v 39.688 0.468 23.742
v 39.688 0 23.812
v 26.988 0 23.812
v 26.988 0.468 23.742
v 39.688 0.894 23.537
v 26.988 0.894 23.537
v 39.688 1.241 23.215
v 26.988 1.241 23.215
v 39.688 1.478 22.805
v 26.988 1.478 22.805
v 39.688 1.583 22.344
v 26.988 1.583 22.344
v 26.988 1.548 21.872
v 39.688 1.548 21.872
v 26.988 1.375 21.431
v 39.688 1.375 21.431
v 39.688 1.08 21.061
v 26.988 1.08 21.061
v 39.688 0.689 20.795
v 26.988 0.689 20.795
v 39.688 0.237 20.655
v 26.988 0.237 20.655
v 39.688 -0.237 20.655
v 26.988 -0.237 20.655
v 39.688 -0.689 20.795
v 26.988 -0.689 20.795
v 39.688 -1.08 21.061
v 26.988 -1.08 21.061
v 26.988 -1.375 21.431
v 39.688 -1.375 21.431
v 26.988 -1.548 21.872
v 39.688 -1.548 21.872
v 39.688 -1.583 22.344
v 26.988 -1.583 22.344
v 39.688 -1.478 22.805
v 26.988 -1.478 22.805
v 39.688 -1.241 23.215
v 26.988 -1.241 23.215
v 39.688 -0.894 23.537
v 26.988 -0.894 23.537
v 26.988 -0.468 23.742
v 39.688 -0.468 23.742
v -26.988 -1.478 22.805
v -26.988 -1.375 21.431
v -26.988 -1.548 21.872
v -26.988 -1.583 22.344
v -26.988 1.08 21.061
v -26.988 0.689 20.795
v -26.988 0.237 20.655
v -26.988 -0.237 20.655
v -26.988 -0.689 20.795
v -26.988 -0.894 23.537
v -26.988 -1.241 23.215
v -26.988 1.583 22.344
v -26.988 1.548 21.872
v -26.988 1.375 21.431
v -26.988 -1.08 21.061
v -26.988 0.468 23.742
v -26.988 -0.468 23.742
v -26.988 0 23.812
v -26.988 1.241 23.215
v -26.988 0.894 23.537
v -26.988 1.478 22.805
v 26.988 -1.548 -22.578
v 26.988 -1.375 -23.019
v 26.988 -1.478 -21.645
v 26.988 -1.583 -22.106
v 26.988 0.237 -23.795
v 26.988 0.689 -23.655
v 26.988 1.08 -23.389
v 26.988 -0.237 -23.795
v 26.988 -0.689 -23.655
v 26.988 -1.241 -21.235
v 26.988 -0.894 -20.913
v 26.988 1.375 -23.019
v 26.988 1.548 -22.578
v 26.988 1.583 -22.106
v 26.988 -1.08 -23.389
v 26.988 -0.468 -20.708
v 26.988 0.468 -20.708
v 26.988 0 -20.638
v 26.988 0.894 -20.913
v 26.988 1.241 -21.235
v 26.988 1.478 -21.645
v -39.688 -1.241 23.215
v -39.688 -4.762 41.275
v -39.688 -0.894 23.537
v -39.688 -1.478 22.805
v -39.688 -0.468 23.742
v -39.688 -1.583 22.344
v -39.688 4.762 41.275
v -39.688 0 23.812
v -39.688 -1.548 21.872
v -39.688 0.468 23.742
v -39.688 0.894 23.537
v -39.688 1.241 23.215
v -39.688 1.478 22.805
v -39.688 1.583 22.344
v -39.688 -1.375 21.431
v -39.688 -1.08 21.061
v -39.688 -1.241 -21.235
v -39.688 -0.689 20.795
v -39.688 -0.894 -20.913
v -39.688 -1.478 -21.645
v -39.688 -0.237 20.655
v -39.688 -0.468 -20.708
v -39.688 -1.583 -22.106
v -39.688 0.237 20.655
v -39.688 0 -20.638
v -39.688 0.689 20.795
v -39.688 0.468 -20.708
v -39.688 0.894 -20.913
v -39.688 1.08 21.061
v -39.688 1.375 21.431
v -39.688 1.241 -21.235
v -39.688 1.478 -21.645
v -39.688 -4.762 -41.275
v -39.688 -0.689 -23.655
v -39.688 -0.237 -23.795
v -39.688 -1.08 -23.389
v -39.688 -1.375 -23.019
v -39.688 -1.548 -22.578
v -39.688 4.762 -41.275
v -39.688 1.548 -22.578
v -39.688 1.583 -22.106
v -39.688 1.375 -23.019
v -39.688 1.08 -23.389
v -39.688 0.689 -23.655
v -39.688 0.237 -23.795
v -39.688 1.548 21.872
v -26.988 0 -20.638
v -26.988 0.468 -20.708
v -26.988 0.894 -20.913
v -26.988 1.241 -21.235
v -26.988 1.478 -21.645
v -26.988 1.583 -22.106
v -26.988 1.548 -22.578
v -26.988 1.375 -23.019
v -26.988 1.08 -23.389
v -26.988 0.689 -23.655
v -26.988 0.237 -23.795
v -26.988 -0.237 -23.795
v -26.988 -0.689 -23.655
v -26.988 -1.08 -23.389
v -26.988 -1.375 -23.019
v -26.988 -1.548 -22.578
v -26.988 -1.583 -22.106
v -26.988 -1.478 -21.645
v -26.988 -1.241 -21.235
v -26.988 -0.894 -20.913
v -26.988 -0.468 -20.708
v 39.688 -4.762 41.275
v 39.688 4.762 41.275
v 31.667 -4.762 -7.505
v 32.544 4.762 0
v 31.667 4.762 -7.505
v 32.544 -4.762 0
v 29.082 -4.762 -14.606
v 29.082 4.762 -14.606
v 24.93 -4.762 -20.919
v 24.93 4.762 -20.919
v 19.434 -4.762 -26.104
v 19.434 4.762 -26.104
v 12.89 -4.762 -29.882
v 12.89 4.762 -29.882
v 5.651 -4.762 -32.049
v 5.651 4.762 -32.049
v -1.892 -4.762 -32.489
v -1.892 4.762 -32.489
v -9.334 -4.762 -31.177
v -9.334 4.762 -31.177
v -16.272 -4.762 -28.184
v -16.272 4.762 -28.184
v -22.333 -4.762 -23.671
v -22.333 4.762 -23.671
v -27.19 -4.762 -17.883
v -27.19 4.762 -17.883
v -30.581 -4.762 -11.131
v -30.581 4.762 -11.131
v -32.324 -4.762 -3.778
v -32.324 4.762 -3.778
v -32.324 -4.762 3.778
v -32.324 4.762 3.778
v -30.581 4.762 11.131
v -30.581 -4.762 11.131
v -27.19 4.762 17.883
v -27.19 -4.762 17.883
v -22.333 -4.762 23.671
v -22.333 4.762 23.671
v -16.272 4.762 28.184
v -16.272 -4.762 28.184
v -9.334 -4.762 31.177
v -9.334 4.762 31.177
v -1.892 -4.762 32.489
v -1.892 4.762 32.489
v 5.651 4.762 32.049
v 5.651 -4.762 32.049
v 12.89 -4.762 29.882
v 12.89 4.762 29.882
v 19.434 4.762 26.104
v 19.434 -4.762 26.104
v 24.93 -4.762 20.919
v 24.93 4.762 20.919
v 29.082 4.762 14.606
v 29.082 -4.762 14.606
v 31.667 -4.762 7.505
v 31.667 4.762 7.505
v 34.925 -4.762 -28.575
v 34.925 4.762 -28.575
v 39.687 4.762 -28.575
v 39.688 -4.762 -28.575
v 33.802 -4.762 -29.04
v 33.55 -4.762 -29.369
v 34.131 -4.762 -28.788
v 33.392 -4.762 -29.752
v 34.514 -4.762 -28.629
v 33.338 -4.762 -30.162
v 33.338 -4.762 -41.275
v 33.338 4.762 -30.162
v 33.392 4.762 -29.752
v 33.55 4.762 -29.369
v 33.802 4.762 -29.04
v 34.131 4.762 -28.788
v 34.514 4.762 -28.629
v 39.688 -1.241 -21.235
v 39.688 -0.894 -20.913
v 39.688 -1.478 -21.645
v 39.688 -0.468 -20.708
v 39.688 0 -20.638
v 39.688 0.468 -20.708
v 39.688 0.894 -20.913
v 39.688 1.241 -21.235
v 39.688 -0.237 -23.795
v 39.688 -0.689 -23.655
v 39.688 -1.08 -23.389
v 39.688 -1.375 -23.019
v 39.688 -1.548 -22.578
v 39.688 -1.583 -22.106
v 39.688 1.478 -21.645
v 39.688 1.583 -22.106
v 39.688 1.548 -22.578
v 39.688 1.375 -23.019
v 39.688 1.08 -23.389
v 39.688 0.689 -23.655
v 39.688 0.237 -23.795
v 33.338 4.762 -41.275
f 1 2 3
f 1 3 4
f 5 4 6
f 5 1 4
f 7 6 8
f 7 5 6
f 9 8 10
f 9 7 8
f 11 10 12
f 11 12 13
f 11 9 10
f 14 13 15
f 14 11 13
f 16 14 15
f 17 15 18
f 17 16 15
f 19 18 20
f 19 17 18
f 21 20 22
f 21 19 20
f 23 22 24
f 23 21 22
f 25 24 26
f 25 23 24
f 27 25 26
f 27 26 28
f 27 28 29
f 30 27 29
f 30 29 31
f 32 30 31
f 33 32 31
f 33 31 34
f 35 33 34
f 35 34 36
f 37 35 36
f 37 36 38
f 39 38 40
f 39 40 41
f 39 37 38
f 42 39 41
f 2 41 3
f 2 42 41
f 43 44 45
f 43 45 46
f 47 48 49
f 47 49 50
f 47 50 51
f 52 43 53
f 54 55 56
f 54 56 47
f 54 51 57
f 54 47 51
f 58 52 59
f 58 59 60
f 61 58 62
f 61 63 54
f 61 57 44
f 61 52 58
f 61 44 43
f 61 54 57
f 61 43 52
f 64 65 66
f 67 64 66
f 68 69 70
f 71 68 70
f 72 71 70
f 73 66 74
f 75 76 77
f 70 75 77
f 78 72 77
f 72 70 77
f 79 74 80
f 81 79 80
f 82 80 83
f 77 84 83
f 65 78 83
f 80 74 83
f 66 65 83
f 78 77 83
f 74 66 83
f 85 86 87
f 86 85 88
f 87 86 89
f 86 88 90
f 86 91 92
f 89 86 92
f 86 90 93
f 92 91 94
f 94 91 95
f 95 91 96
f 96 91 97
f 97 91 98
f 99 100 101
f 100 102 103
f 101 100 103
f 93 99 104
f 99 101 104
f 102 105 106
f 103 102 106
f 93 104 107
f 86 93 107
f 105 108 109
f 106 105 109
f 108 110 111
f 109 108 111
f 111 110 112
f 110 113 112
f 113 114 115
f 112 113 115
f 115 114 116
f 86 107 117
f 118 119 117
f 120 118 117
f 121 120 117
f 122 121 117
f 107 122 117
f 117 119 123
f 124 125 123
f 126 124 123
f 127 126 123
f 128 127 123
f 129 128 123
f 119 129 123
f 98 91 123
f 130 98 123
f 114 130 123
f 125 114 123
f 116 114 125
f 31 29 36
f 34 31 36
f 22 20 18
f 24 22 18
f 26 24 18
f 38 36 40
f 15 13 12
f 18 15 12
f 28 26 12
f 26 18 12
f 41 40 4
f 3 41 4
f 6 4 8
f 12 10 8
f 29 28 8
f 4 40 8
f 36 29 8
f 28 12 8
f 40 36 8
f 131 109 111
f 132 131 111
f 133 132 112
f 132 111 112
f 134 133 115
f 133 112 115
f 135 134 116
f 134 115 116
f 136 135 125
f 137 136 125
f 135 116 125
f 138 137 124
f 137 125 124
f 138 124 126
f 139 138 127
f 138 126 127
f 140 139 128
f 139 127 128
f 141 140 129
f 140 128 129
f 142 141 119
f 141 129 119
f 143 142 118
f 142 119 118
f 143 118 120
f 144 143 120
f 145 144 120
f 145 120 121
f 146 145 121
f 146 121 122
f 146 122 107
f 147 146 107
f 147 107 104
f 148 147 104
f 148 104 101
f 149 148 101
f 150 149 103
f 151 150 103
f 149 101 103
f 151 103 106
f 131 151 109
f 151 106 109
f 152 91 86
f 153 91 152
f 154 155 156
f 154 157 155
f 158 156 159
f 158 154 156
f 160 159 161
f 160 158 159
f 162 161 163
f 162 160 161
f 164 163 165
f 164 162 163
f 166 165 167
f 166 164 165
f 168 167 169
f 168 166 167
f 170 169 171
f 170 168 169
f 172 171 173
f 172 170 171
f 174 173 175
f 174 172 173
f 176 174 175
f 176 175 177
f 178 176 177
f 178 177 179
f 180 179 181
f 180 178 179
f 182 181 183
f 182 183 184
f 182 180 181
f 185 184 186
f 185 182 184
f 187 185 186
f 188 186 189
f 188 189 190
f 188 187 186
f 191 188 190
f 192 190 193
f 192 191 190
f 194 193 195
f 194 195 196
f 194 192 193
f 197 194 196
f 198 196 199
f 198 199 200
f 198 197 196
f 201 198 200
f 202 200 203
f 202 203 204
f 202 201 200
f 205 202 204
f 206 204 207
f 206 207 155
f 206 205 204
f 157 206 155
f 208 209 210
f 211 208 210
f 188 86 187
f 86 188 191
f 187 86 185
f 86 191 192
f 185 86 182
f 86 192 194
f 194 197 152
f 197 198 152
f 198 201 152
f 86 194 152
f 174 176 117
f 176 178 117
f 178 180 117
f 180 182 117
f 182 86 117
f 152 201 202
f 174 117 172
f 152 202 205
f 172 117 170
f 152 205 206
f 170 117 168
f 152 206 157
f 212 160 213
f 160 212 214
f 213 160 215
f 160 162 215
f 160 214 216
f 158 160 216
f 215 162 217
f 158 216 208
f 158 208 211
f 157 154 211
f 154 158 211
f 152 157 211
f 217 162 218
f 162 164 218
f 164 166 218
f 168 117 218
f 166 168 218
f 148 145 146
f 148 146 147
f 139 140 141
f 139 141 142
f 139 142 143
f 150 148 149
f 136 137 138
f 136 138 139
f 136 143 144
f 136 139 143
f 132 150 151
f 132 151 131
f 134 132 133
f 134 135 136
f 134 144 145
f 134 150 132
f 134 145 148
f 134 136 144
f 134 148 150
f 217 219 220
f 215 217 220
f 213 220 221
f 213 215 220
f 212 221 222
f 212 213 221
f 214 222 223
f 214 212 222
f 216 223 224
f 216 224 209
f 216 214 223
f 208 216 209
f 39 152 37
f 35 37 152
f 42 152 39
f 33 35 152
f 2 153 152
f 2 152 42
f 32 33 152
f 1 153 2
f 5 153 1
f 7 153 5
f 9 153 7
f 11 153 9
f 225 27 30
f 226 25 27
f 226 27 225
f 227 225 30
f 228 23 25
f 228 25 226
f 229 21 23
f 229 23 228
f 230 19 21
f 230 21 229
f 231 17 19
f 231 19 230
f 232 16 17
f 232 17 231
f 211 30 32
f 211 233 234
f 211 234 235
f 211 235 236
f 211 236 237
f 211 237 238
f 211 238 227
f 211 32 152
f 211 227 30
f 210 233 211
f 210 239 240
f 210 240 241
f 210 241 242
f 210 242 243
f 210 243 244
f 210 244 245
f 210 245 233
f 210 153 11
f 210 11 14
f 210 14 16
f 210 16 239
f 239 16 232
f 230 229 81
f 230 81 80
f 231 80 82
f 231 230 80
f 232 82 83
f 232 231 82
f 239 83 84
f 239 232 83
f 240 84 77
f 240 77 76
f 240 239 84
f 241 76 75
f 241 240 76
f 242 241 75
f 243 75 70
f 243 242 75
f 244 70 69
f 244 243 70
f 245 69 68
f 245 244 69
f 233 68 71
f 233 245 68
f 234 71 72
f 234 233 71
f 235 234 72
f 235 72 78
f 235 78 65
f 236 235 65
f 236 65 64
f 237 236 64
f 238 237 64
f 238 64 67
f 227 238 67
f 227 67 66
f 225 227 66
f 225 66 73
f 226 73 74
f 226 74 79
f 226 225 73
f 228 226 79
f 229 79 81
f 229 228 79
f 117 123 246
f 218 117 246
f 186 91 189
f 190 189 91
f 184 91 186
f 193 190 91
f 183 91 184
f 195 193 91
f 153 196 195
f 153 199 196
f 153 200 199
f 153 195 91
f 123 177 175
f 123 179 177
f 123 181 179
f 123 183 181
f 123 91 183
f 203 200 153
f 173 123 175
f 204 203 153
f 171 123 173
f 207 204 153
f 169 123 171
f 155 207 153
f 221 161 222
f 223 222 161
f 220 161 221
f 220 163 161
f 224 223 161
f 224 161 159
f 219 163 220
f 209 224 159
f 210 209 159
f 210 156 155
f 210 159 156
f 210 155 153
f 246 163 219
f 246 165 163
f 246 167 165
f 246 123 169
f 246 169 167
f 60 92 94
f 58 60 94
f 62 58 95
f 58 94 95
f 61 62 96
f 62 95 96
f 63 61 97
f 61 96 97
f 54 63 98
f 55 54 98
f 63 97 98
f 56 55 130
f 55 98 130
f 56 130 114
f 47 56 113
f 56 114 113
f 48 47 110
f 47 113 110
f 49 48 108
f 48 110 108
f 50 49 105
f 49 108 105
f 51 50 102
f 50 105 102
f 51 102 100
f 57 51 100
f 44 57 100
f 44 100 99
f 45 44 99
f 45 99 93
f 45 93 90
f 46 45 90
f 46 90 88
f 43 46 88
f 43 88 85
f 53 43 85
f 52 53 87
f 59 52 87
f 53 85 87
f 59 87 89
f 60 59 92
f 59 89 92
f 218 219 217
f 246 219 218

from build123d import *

# Parameters (mm, degrees)
SKETCH1_W           = 79.375
SKETCH1_H           = 82.55
SKETCH1_R           = 32.54375
BOSS_EXTRUDE1_DEPTH = 4.7625
SKETCH2_R           = 1.5875
CUT_EXTRUDE1_DEPTH  = 12.7
SKETCH3_W           = 12.7
SKETCH3_H           = 6.35
CUT_EXTRUDE2_DEPTH  = 10.525
FILLET1_R           = 1.5875


with BuildPart() as part:
    # Sketch1 → Boss-Extrude1 (new body, symmetric)
    with BuildSketch(Plane(origin=(0, 0, 0), x_dir=(1, 0, 0), z_dir=(0, 1, 0))):
        Rectangle(SKETCH1_W, SKETCH1_H)
        Circle(SKETCH1_R, mode=Mode.SUBTRACT)
    extrude(amount=BOSS_EXTRUDE1_DEPTH, both=True)

    # Sketch2 → Cut-Extrude1 (cut)
    with BuildSketch(Plane.ZY.offset(39.6875)):
        with Locations((-22.225, 0)):
            Circle(SKETCH2_R)
        with Locations((22.225, 0)):
            Circle(SKETCH2_R)
    cut_extrude1 = extrude(amount=-CUT_EXTRUDE1_DEPTH, mode=Mode.SUBTRACT)

    # Mirror1: Cut-Extrude1 across plane
    add(cut_extrude1.mirror(Plane(origin=(0, 0, 0), x_dir=(0, 0, 1), z_dir=(1, 0, 0))), mode=Mode.SUBTRACT)

    # Sketch3 → Cut-Extrude2 (cut, through all)
    with BuildSketch(Plane(origin=(34.925, 4.7625, 0), x_dir=(0, 0, -1), z_dir=(0, -1, 0))):
        with Locations((34.925, 1.5875)):
            Rectangle(SKETCH3_W, SKETCH3_H)
    extrude(amount=CUT_EXTRUDE2_DEPTH, mode=Mode.SUBTRACT)

    # Fillet1
    fillet1_edges = [part.edges().sort_by_distance(p)[0] for p in [
        (33.3375, 0, -28.575),
    ]]
    fillet(fillet1_edges, radius=FILLET1_R)


solid = part.part
